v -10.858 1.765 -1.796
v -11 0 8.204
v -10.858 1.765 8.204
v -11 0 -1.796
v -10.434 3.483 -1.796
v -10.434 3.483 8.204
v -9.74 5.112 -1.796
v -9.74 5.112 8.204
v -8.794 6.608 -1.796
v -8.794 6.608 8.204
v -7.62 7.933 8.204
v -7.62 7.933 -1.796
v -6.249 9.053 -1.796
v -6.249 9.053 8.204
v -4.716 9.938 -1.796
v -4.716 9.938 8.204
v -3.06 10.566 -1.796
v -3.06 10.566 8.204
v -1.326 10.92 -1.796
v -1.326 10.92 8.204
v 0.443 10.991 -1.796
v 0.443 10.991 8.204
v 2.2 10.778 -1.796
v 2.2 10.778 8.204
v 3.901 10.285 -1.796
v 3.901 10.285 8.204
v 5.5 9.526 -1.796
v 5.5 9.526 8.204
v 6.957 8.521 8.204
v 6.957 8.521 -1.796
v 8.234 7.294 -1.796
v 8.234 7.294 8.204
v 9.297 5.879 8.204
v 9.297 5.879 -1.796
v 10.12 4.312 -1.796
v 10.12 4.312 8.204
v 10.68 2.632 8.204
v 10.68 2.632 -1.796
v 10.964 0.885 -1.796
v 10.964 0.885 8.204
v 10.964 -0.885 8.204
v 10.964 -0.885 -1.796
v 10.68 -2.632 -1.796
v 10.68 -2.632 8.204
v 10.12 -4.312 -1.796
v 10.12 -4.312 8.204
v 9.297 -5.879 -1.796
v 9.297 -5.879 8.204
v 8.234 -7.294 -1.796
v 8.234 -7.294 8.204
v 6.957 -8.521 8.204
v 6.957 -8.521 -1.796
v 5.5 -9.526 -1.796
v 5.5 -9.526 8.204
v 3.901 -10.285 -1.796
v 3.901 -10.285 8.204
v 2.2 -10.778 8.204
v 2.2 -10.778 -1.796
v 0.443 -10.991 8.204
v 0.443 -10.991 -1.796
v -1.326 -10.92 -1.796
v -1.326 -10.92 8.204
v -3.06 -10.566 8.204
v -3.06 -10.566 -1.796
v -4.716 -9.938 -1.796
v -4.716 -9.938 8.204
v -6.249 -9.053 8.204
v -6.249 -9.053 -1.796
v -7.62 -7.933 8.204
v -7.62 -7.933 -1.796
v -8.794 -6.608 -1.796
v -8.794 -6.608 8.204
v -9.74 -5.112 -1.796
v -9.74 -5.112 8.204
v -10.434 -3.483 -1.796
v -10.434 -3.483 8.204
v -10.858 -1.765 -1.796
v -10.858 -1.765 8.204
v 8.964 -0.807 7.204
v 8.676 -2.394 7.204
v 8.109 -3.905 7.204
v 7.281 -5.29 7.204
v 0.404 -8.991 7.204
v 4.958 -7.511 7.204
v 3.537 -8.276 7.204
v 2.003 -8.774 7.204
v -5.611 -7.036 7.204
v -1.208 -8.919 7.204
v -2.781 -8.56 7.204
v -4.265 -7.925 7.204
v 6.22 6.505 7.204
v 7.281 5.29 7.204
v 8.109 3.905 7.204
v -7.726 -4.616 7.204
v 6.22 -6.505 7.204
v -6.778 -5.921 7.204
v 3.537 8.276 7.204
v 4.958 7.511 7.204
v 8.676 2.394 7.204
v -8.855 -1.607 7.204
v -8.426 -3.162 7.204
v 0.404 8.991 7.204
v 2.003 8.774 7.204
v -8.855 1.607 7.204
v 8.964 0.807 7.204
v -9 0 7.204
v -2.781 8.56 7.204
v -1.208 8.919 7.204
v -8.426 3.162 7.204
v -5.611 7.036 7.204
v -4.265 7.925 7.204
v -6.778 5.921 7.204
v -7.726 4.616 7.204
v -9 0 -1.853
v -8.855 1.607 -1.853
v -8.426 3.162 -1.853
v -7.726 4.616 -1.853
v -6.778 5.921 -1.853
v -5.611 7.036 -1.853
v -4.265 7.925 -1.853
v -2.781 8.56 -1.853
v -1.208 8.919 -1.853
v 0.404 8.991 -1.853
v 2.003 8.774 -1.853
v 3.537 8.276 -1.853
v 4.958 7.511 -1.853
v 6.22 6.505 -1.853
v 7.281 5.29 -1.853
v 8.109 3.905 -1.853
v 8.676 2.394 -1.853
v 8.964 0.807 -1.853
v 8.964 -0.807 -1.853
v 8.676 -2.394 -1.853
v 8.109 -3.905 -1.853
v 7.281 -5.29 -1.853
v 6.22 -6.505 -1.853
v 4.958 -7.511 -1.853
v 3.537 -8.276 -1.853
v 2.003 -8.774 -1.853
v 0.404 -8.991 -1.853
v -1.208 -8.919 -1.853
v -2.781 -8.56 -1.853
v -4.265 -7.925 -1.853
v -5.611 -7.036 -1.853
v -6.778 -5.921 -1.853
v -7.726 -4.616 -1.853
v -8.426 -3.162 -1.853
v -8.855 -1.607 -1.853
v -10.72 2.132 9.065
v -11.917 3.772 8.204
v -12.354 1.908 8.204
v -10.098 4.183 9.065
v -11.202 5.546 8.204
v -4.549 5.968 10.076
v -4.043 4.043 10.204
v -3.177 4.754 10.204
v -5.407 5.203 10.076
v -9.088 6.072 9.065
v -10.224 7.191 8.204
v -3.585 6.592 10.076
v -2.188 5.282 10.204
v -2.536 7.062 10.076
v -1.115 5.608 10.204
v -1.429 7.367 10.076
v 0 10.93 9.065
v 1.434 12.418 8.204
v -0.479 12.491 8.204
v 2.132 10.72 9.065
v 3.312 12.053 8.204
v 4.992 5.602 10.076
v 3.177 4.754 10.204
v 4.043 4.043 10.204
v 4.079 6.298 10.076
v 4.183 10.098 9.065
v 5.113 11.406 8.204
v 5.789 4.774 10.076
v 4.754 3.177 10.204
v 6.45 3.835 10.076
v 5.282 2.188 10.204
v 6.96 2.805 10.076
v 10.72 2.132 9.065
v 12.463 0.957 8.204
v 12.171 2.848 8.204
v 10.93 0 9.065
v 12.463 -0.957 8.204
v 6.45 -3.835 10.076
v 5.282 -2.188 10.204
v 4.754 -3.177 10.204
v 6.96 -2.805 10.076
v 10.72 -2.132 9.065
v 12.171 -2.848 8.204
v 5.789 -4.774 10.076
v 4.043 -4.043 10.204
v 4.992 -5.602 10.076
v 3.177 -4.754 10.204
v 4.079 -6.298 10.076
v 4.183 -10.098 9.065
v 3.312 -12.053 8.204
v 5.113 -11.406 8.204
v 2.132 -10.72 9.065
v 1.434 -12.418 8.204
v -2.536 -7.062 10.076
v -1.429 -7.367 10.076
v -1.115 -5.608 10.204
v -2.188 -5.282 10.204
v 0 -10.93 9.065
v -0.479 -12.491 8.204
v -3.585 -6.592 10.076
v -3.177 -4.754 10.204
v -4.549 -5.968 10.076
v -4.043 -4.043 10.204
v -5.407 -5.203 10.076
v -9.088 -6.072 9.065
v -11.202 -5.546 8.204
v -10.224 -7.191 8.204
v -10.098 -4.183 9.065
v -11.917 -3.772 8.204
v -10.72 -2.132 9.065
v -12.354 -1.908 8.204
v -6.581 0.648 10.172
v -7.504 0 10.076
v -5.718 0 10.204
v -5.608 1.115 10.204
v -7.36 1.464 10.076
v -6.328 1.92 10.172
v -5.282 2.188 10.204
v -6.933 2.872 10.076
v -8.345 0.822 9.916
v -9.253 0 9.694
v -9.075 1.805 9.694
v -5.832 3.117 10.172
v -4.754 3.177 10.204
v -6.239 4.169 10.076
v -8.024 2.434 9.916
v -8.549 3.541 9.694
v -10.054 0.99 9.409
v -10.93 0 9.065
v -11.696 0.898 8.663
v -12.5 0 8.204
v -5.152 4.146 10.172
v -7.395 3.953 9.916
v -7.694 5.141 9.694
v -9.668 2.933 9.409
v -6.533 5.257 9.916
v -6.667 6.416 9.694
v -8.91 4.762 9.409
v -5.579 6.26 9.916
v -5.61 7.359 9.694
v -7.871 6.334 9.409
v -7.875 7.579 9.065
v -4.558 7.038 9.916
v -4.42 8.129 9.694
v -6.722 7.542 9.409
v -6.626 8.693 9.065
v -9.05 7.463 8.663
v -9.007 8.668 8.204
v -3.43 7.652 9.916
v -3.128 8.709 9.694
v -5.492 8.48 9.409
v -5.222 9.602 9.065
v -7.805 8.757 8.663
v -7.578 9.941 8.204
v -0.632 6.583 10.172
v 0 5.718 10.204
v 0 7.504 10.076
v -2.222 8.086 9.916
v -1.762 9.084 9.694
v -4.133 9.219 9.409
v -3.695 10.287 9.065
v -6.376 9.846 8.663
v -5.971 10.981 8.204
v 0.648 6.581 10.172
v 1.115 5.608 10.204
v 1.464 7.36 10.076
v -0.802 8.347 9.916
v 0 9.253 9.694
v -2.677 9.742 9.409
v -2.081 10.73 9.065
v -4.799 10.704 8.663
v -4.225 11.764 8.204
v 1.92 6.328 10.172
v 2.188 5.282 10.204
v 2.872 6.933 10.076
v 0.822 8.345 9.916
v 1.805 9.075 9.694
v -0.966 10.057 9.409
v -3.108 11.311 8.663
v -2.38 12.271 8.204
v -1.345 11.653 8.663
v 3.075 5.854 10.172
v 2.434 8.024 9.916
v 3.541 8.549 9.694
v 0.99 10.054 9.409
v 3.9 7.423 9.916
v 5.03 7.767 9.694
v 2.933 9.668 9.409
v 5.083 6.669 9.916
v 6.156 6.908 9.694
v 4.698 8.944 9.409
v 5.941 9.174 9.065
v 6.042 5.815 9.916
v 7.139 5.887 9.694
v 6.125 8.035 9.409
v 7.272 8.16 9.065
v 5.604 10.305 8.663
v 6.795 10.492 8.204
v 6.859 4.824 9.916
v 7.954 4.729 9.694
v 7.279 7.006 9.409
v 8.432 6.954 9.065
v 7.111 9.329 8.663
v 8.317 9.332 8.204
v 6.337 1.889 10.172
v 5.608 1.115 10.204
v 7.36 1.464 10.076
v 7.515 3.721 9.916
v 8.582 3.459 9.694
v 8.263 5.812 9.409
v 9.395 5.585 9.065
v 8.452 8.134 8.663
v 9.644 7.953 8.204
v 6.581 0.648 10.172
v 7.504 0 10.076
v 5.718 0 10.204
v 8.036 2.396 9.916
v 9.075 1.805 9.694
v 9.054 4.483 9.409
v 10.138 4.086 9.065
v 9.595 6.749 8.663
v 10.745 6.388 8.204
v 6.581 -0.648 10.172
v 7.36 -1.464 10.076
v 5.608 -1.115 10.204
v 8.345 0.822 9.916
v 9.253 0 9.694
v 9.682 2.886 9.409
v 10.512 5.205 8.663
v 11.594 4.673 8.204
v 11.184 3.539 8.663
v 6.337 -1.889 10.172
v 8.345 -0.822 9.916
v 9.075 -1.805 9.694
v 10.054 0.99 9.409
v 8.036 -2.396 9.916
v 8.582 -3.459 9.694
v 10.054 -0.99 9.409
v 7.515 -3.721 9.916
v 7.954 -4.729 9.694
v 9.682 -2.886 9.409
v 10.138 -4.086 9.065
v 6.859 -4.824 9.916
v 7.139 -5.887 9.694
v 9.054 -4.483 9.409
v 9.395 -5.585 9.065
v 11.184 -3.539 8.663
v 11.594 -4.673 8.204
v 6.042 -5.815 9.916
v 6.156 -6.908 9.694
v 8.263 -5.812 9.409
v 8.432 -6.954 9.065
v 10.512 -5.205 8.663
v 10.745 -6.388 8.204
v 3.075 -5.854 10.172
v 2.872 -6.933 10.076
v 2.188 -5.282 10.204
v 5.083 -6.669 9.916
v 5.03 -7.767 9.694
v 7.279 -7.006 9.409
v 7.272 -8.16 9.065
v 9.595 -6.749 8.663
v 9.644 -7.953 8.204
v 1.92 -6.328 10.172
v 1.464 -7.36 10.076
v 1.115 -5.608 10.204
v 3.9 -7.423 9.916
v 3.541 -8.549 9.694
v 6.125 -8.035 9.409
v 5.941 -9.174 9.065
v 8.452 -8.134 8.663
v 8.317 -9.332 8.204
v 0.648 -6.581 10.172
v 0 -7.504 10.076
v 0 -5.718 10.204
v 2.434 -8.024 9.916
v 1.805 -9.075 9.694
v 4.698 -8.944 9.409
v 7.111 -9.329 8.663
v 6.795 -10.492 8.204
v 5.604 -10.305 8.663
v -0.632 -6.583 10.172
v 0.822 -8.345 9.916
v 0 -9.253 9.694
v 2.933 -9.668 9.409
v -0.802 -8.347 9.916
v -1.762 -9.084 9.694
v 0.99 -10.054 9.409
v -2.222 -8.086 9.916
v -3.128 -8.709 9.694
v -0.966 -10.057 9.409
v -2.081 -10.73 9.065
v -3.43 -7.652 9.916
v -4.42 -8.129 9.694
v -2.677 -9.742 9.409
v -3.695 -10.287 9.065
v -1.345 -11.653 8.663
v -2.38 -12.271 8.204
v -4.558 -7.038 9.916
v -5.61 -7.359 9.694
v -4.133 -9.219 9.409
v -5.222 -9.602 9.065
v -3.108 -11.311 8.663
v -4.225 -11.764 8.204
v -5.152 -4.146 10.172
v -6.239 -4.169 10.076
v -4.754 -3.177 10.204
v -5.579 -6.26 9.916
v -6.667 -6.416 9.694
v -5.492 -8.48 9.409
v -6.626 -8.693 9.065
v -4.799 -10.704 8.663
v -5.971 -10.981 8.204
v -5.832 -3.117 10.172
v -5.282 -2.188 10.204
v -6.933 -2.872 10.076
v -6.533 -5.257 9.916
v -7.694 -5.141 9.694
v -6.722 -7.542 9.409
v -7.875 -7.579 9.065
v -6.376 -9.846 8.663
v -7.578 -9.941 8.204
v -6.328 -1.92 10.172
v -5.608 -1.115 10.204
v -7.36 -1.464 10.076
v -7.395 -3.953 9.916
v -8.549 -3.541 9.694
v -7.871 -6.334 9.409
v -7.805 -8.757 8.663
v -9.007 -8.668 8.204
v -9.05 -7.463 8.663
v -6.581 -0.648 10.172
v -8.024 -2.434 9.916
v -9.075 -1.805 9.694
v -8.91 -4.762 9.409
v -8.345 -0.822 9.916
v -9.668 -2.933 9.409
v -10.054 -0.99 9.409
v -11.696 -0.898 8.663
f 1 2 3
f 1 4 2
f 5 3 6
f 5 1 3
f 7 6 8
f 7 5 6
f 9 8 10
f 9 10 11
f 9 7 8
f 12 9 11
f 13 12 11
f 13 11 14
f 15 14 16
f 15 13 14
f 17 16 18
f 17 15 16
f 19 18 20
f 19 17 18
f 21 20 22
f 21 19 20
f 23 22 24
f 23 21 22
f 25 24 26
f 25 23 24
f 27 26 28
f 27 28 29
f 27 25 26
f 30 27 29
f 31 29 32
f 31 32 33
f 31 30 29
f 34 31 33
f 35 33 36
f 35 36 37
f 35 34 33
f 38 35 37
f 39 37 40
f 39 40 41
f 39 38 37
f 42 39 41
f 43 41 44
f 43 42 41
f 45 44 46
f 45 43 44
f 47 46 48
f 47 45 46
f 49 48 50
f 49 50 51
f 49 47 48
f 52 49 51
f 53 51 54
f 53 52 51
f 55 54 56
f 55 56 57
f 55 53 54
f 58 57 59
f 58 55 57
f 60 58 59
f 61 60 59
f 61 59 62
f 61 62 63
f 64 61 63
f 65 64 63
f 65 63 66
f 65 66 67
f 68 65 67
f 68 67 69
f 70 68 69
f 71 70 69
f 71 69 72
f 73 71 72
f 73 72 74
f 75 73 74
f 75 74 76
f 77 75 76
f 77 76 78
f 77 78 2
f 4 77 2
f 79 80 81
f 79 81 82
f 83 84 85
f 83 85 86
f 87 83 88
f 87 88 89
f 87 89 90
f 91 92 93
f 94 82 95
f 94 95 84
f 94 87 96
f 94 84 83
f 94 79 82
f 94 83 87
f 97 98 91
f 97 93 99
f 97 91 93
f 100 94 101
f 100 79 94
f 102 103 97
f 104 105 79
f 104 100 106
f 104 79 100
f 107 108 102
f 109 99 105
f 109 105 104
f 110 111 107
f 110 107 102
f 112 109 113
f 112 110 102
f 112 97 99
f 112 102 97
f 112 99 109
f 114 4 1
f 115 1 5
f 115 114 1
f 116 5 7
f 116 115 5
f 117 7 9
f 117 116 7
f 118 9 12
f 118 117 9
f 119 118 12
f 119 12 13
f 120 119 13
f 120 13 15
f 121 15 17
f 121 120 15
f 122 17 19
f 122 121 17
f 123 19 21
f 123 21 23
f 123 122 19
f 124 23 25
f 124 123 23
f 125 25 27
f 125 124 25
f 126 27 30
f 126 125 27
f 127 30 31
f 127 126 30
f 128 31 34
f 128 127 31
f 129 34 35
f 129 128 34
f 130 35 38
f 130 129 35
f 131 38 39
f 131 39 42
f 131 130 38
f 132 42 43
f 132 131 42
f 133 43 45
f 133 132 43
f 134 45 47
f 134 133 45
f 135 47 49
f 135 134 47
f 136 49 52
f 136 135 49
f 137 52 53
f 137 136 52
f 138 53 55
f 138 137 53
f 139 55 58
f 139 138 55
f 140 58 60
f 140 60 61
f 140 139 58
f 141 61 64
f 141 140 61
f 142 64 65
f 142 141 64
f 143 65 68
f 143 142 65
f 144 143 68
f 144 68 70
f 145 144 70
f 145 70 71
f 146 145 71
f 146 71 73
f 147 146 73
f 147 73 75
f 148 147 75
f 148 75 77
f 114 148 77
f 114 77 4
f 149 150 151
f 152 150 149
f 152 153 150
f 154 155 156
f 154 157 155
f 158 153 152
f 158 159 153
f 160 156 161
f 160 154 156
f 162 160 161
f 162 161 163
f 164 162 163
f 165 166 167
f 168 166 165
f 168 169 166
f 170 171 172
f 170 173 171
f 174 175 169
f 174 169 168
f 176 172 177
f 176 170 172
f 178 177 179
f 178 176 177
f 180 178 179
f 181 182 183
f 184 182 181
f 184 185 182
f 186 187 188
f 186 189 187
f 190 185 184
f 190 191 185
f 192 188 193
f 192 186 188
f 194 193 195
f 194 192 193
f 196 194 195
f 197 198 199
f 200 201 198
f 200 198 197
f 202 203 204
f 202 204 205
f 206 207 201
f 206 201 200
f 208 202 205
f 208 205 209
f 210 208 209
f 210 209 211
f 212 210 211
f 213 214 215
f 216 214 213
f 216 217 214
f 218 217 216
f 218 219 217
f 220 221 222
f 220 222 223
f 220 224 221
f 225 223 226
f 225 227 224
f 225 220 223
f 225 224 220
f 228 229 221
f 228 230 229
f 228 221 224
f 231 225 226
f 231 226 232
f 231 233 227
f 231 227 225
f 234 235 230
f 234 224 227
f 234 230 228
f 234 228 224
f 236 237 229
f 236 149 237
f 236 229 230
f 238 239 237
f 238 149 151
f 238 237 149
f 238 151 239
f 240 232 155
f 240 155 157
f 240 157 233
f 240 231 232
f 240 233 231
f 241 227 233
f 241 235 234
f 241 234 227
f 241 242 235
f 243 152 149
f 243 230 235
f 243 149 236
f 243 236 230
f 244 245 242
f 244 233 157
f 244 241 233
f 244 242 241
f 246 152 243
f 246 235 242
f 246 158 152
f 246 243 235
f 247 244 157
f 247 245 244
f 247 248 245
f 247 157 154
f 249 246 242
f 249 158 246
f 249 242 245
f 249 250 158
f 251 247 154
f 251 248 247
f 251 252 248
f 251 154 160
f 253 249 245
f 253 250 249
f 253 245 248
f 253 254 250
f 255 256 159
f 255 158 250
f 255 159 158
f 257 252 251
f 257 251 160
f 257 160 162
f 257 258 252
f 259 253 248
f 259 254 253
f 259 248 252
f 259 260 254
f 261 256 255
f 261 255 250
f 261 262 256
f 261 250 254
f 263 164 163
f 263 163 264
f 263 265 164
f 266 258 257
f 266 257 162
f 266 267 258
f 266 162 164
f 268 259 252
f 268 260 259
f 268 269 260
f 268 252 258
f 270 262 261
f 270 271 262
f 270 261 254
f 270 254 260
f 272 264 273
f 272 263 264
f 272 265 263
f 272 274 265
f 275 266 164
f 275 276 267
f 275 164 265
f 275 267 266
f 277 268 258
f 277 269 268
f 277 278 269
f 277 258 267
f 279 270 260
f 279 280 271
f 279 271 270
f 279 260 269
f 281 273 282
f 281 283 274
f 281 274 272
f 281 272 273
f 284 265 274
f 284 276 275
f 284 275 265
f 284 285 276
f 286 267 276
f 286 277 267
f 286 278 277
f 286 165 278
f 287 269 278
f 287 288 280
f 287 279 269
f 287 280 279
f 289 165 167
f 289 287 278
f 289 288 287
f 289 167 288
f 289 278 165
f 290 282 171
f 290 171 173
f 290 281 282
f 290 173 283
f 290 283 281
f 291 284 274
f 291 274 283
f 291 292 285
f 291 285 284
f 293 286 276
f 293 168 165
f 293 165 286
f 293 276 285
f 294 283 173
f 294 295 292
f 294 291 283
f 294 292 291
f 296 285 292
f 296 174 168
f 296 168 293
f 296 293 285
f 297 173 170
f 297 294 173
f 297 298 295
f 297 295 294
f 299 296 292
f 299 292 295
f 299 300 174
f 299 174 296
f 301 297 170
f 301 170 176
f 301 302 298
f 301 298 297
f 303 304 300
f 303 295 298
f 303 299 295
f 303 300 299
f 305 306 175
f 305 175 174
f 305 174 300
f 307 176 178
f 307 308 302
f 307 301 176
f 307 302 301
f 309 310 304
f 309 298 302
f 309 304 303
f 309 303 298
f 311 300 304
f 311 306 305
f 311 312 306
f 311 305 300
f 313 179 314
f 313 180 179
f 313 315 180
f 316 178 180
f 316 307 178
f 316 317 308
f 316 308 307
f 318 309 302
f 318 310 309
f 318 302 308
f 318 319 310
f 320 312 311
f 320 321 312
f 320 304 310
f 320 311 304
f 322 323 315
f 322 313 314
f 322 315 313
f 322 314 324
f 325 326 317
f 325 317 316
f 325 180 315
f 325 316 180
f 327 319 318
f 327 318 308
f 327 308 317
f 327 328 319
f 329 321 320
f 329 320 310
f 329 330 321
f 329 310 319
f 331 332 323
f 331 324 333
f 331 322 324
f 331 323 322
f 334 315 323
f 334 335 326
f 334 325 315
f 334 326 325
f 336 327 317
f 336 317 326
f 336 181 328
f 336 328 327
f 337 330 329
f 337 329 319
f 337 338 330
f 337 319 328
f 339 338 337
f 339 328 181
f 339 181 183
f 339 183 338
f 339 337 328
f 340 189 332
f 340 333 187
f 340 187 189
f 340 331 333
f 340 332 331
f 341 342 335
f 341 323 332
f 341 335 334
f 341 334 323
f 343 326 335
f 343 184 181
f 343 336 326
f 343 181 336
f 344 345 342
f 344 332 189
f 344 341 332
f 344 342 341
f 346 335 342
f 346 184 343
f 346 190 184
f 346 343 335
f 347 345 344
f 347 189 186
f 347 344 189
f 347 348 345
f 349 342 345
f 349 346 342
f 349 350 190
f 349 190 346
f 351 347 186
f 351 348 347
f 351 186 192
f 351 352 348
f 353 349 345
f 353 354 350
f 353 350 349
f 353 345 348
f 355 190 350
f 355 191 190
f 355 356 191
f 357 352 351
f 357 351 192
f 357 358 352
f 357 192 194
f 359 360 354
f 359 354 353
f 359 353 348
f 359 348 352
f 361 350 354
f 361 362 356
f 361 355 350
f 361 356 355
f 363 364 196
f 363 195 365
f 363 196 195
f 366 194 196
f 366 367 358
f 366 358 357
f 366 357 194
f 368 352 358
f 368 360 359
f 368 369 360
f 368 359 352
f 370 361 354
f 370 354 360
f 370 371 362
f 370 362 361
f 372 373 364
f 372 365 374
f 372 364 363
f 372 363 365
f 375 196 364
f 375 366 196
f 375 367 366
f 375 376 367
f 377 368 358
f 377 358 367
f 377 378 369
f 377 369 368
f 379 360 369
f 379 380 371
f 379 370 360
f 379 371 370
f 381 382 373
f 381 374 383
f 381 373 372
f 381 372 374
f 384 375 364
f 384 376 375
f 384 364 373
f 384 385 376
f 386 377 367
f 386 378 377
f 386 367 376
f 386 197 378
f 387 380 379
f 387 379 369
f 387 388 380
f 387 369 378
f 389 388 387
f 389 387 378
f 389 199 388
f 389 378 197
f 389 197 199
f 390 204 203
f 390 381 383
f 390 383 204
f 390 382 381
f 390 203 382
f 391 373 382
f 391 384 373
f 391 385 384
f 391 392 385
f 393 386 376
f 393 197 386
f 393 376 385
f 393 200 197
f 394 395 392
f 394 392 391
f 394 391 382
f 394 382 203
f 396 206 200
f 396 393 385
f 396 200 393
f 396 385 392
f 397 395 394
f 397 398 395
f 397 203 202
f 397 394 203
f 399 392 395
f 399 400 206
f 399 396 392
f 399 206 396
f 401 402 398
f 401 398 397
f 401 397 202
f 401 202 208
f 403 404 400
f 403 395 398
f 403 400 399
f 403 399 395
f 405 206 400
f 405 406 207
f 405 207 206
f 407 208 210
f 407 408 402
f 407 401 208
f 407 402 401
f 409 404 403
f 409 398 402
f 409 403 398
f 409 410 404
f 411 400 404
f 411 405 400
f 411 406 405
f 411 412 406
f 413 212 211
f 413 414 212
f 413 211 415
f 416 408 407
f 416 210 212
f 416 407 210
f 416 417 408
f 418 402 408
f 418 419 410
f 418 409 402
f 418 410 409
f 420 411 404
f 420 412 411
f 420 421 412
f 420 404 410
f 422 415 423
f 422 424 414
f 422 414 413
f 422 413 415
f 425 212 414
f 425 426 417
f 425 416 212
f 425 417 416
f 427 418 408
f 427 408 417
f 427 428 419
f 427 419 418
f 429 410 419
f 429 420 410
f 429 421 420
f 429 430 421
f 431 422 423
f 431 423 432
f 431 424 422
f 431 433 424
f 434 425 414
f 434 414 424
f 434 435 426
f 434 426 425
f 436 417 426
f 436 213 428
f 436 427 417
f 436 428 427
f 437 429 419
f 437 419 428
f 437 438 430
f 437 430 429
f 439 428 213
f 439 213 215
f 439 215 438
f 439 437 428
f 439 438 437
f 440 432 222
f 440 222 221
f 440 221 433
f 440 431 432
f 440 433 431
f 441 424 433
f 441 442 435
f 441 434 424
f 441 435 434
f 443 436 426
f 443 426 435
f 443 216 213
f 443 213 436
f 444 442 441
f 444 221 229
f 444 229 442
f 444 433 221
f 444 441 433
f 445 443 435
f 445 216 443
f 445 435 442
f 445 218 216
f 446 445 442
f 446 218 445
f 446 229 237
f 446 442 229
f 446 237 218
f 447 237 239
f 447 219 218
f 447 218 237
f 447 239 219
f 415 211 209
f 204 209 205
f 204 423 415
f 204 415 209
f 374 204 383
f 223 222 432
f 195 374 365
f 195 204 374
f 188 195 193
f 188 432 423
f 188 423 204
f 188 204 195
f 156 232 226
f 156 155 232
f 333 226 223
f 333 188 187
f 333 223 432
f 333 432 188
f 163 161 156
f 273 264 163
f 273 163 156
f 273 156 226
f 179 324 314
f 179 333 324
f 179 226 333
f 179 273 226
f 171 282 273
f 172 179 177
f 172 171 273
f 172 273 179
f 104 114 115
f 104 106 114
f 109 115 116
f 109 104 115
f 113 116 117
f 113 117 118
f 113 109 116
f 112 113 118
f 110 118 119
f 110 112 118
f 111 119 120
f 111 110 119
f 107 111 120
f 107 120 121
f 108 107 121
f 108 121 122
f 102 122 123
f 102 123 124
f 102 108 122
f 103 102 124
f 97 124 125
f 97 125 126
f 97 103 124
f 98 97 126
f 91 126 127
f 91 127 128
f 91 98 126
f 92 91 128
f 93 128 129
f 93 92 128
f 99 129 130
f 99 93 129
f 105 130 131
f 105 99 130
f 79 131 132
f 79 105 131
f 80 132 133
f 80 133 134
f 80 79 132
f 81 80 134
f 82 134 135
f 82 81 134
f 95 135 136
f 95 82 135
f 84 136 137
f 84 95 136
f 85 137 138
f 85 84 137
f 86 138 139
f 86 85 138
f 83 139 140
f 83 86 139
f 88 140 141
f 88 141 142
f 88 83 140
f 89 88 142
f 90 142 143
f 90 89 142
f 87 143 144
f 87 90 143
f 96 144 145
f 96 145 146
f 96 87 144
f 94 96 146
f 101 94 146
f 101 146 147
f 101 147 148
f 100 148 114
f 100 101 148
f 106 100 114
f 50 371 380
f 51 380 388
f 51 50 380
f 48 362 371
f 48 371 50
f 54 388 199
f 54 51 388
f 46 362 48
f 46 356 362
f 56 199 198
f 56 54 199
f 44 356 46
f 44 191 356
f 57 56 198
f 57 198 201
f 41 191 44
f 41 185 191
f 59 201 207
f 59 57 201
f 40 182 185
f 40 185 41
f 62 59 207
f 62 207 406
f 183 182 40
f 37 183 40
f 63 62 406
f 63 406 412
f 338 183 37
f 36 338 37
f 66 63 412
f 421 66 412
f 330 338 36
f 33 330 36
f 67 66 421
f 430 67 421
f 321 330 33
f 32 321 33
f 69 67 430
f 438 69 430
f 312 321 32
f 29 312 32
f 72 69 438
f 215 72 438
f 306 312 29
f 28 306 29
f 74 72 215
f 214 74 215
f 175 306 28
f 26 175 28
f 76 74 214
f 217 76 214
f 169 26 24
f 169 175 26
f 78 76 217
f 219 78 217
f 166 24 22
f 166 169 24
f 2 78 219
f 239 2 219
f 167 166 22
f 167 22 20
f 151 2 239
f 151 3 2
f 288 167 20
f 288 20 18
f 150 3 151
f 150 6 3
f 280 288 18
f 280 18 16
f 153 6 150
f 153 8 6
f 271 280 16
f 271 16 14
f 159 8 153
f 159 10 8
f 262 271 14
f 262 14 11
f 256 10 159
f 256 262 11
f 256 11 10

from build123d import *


# Not quite as in the source:
# - a fillet or chamfer that OpenCascade refuses, or shapes differently, is made with other operations: its cross-section is extruded or revolved along the edge and cut away or added


with BuildPart() as f1:
    # F0 (on Front) → F1 (revolve)
    with BuildSketch(Plane.XZ):
        Polygon((0, 7.2039468596), (0, 10.2039468596), (-12.5, 10.2039468596), (-12.5, 8.2039468596), (-11, 8.2039468596), (-11, -1.7960531404), (-9, -1.853223308), (-9, 7.2039468596), align=None)
    revolve(axis=Axis((0, 0, 8.7039468596), (0, 0, -1)))

    # F2: fillet of radius 12.5 on 1 edges, made by hand

    # F2_s1 → F2_t2 (revolve, cut)
    with BuildSketch(Plane.XZ):
        with BuildLine():
            ThreePointArc((-5.7176700169, 10.2039468596), (-9.2532039228, 9.6935256679), (-12.5, 8.2039468596))
            Line((-12.5, 8.2039468596), (-12.6356465997, 8.4139468596))
            ThreePointArc((-12.6356465997, 8.4139468596), (-12.75, 9.2039468596), (-12.75, 10.2039468596))
            Line((-12.75, 10.2039468596), (-12.5, 10.4539468596))
            Line((-12.5, 10.4539468596), (-5.7176700169, 10.4539468596))
            Line((-5.7176700169, 10.4539468596), (-5.7176700169, 10.2039468596))
        make_face()
    revolve(axis=Axis((0, 0, 10.2039468596), (0, 0, -1)), mode=Mode.SUBTRACT)


solid = f1.part
